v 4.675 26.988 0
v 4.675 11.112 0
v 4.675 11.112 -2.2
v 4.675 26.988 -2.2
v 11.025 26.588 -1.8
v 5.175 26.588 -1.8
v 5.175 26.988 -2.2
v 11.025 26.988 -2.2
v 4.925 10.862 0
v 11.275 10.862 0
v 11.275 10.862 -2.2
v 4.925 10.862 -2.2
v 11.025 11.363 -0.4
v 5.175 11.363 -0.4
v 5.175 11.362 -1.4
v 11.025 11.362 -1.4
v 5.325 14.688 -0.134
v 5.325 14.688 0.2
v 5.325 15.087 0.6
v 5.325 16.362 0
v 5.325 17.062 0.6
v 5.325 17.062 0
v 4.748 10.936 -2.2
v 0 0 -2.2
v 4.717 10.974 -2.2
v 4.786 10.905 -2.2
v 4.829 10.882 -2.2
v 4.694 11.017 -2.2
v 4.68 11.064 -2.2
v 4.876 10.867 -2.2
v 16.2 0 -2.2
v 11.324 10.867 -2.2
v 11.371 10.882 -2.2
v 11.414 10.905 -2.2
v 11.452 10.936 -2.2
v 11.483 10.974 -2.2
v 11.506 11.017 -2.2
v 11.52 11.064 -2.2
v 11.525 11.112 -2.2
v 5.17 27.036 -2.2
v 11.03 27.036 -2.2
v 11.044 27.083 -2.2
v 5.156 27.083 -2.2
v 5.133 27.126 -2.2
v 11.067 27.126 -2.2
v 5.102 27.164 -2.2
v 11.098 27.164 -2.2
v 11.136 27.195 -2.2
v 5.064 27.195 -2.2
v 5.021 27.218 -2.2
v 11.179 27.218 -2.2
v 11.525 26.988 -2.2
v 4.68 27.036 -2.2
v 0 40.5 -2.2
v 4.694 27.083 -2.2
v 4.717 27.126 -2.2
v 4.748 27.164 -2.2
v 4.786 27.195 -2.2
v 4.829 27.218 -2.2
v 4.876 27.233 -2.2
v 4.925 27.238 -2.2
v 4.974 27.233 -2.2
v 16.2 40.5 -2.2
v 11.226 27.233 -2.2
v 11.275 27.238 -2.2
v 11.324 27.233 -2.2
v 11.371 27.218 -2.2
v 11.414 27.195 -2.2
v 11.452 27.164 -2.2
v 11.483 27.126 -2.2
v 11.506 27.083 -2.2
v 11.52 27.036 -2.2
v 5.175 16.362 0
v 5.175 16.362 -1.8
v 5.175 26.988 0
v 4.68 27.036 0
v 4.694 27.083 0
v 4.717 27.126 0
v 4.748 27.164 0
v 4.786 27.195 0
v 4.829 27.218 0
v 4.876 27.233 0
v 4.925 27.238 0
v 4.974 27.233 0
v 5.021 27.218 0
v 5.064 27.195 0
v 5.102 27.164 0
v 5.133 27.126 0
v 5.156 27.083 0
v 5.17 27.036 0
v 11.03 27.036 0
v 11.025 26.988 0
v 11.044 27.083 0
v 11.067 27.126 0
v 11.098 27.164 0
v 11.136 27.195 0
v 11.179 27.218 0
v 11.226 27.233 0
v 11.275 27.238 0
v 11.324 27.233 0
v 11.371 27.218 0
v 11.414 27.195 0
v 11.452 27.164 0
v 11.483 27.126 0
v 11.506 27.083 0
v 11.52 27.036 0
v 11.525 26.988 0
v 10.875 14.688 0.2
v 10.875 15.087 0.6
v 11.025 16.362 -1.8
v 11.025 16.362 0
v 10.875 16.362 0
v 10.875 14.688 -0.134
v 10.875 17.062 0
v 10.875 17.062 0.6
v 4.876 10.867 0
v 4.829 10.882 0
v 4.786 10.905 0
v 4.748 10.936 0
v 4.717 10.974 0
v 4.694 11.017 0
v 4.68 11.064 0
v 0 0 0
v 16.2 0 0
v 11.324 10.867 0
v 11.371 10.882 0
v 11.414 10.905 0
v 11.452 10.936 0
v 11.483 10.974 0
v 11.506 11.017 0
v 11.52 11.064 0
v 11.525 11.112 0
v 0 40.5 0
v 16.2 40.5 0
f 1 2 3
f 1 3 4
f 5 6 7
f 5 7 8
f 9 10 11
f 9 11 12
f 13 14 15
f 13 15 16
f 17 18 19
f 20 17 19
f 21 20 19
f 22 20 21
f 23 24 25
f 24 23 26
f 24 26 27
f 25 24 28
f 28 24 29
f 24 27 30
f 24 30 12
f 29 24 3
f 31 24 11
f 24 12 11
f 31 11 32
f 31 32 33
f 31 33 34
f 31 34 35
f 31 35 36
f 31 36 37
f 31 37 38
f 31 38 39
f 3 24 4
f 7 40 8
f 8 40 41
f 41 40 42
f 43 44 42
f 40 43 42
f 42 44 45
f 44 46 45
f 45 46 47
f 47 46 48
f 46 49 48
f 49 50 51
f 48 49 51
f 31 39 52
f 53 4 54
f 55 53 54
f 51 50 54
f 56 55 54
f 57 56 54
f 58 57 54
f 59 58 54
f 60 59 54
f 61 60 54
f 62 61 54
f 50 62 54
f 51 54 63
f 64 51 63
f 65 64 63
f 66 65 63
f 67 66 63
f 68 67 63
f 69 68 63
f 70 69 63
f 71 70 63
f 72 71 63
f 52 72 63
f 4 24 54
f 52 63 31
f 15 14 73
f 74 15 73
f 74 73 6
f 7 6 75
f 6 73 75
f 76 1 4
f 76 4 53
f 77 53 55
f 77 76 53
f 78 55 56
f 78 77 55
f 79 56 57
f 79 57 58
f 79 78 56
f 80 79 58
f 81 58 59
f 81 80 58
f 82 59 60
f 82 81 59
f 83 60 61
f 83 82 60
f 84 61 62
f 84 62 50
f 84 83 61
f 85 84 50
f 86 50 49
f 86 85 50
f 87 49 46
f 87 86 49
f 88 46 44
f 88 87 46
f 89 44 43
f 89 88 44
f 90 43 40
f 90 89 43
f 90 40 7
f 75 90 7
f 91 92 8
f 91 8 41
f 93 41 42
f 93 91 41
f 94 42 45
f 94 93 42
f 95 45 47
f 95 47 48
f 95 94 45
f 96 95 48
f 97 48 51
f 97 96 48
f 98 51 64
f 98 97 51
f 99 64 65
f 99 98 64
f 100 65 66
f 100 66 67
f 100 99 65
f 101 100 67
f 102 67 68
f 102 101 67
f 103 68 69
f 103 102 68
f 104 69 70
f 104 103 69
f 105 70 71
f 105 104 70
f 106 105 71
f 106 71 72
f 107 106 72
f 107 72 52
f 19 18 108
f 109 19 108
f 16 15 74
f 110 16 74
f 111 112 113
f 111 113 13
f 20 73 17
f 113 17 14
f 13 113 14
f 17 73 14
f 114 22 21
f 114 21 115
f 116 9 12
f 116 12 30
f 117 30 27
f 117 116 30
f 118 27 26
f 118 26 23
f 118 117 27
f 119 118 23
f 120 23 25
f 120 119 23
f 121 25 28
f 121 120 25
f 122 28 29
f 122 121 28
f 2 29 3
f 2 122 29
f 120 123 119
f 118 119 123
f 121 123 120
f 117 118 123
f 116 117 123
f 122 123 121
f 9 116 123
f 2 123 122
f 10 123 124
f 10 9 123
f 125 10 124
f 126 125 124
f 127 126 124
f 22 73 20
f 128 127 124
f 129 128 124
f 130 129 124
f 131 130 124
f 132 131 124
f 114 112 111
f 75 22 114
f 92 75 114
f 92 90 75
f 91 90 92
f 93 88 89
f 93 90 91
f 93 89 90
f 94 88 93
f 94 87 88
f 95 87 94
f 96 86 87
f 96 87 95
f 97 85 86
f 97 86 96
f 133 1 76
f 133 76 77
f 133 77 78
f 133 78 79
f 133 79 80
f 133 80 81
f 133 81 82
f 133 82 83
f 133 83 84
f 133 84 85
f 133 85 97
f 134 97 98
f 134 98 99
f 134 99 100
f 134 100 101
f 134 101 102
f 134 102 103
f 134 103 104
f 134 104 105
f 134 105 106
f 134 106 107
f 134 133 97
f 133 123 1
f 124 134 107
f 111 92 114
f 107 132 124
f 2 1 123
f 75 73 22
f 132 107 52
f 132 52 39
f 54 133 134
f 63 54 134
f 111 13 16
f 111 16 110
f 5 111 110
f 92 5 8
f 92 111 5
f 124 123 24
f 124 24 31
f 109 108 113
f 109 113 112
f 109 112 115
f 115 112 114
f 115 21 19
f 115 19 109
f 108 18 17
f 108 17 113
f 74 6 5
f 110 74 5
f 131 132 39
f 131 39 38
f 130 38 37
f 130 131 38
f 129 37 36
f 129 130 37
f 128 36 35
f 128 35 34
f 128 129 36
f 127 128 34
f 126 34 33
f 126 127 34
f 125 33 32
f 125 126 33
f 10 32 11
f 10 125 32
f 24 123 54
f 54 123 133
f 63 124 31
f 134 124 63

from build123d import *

# Parameters (mm, degrees)
F0_W         = 16.2
F0_H         = 40.5
F1_DEPTH     = 2.2
F0_W_2       = 5.85
F0_H_2       = 15.625
F0_W_3       = 5.55
F0_H_3       = 2.375
F2_DEPTH     = 1.8
F3_DEPTH     = 0.6
F4_T1_DEPTH  = 5.85
F4_T6_DEPTH  = 18.8484687937
F4_T11_DEPTH = 5.85
F4_T16_DEPTH = 18.8484687937
F5_SIZE      = 0.39999


# Not quite as in the source:
# - a fillet or chamfer that OpenCascade refuses, or shapes differently, is made with other operations: its cross-section is extruded or revolved along the edge and cut away or added
# - a fillet or chamfer is up to 0.001 mm smaller than in the source, because OpenCascade refuses the exact size


with BuildPart() as f1:
    # F0 (on Top) → F1 (new body)
    with BuildSketch(Plane.XY):
        with Locations((8.1, 20.25)):
            Rectangle(F0_W, F0_H)
        with BuildLine():
            Line((11.275, 10.8625), (4.925, 10.8625))
            ThreePointArc((4.925, 10.8625), (4.7482233047, 10.9357233047), (4.675, 11.1125))
            Line((4.675, 11.1125), (4.675, 26.9875))
            ThreePointArc((4.675, 26.9875), (4.925, 27.2375), (5.175, 26.9875))
            Line((5.175, 26.9875), (11.025, 26.9875))
            ThreePointArc((11.025, 26.9875), (11.275, 27.2375), (11.525, 26.9875))
            Line((11.525, 26.9875), (11.525, 11.1125))
            ThreePointArc((11.525, 11.1125), (11.4517766953, 10.9357233047), (11.275, 10.8625))
        make_face(mode=Mode.SUBTRACT)
    extrude(amount=-F1_DEPTH)

    # F0 (on Top) → F2 (join)
    with BuildSketch(Plane.XY):
        with Locations((8.1, 19.175)):
            Rectangle(F0_W_2, F0_H_2)
        with Locations((8.1, 15.875)):
            Rectangle(F0_W_3, F0_H_3, mode=Mode.SUBTRACT)
        with Locations((8.1, 15.875)):
            Rectangle(F0_W_3, F0_H_3)
    extrude(amount=-F2_DEPTH)

    # F0 (on Top) → F3 (join)
    with BuildSketch(Plane.XY):
        with Locations((8.1, 15.875)):
            Rectangle(F0_W_3, F0_H_3)
    extrude(amount=F3_DEPTH)

    # F4: chamfer of 5 x 0.4 on 2 edges, made by hand

    # F4_s2 → F4_t1 (cut)
    with BuildSketch(Plane.YZ.offset(5.175)):
        Polygon((11.3625, -1.4), (16.3625, -1.8), (11.3625, -1.8), align=None)
    extrude(amount=F4_T1_DEPTH, mode=Mode.SUBTRACT)


with BuildPart() as f4_tool4:
    # F4_s5 → F4_t6 (new body)
    with BuildSketch(Plane.YZ.offset(5.175)):
        Polygon((16.3625, 0), (11.3625, -0.4), (11.3625, 0), align=None)
    extrude(amount=F4_T6_DEPTH)

    split(bisect_by=Plane.YZ.offset(5.325), keep=Keep.BOTTOM)


with BuildPart() as f1_1:
    add(f1.part)

    # F4_t3: cut F4_tool4
    add(f4_tool4.part, mode=Mode.SUBTRACT)


with BuildPart() as f4_tool9:
    # F4_s10 → F4_t11 (new body)
    with BuildSketch(Plane.YZ.offset(5.175)):
        Polygon((16.3625, 0), (11.3625, -0.4), (11.3625, 0), align=None)
    extrude(amount=F4_T11_DEPTH)

    split(bisect_by=Plane.XZ.offset(-14.6875), keep=Keep.TOP)


with BuildPart() as f1_2:
    add(f1_1.part)

    # F4_t8: cut F4_tool9
    add(f4_tool9.part, mode=Mode.SUBTRACT)


with BuildPart() as f4_tool14:
    # F4_s15 → F4_t16 (new body)
    with BuildSketch(Plane.YZ.offset(-7.8234687937)):
        Polygon((16.3625, 0), (11.3625, -0.4), (11.3625, 0), align=None)
    extrude(amount=F4_T16_DEPTH)

    split(bisect_by=Plane.YZ.offset(10.875), keep=Keep.TOP)


with BuildPart() as f1_3:
    add(f1_2.part)

    # F4_t13: cut F4_tool14
    add(f4_tool14.part, mode=Mode.SUBTRACT)

    # F5 (size 0.4 in the source; OpenCascade refuses exactly that, so slightly less here)
    f5_edges = [f1_3.edges().sort_by_distance(p)[0] for p in [
        (8.1, 14.6875, 0.6),
        (8.1, 26.9875, -1.8),
    ]]
    chamfer(f5_edges, length=F5_SIZE)


solid = f1_3.part
